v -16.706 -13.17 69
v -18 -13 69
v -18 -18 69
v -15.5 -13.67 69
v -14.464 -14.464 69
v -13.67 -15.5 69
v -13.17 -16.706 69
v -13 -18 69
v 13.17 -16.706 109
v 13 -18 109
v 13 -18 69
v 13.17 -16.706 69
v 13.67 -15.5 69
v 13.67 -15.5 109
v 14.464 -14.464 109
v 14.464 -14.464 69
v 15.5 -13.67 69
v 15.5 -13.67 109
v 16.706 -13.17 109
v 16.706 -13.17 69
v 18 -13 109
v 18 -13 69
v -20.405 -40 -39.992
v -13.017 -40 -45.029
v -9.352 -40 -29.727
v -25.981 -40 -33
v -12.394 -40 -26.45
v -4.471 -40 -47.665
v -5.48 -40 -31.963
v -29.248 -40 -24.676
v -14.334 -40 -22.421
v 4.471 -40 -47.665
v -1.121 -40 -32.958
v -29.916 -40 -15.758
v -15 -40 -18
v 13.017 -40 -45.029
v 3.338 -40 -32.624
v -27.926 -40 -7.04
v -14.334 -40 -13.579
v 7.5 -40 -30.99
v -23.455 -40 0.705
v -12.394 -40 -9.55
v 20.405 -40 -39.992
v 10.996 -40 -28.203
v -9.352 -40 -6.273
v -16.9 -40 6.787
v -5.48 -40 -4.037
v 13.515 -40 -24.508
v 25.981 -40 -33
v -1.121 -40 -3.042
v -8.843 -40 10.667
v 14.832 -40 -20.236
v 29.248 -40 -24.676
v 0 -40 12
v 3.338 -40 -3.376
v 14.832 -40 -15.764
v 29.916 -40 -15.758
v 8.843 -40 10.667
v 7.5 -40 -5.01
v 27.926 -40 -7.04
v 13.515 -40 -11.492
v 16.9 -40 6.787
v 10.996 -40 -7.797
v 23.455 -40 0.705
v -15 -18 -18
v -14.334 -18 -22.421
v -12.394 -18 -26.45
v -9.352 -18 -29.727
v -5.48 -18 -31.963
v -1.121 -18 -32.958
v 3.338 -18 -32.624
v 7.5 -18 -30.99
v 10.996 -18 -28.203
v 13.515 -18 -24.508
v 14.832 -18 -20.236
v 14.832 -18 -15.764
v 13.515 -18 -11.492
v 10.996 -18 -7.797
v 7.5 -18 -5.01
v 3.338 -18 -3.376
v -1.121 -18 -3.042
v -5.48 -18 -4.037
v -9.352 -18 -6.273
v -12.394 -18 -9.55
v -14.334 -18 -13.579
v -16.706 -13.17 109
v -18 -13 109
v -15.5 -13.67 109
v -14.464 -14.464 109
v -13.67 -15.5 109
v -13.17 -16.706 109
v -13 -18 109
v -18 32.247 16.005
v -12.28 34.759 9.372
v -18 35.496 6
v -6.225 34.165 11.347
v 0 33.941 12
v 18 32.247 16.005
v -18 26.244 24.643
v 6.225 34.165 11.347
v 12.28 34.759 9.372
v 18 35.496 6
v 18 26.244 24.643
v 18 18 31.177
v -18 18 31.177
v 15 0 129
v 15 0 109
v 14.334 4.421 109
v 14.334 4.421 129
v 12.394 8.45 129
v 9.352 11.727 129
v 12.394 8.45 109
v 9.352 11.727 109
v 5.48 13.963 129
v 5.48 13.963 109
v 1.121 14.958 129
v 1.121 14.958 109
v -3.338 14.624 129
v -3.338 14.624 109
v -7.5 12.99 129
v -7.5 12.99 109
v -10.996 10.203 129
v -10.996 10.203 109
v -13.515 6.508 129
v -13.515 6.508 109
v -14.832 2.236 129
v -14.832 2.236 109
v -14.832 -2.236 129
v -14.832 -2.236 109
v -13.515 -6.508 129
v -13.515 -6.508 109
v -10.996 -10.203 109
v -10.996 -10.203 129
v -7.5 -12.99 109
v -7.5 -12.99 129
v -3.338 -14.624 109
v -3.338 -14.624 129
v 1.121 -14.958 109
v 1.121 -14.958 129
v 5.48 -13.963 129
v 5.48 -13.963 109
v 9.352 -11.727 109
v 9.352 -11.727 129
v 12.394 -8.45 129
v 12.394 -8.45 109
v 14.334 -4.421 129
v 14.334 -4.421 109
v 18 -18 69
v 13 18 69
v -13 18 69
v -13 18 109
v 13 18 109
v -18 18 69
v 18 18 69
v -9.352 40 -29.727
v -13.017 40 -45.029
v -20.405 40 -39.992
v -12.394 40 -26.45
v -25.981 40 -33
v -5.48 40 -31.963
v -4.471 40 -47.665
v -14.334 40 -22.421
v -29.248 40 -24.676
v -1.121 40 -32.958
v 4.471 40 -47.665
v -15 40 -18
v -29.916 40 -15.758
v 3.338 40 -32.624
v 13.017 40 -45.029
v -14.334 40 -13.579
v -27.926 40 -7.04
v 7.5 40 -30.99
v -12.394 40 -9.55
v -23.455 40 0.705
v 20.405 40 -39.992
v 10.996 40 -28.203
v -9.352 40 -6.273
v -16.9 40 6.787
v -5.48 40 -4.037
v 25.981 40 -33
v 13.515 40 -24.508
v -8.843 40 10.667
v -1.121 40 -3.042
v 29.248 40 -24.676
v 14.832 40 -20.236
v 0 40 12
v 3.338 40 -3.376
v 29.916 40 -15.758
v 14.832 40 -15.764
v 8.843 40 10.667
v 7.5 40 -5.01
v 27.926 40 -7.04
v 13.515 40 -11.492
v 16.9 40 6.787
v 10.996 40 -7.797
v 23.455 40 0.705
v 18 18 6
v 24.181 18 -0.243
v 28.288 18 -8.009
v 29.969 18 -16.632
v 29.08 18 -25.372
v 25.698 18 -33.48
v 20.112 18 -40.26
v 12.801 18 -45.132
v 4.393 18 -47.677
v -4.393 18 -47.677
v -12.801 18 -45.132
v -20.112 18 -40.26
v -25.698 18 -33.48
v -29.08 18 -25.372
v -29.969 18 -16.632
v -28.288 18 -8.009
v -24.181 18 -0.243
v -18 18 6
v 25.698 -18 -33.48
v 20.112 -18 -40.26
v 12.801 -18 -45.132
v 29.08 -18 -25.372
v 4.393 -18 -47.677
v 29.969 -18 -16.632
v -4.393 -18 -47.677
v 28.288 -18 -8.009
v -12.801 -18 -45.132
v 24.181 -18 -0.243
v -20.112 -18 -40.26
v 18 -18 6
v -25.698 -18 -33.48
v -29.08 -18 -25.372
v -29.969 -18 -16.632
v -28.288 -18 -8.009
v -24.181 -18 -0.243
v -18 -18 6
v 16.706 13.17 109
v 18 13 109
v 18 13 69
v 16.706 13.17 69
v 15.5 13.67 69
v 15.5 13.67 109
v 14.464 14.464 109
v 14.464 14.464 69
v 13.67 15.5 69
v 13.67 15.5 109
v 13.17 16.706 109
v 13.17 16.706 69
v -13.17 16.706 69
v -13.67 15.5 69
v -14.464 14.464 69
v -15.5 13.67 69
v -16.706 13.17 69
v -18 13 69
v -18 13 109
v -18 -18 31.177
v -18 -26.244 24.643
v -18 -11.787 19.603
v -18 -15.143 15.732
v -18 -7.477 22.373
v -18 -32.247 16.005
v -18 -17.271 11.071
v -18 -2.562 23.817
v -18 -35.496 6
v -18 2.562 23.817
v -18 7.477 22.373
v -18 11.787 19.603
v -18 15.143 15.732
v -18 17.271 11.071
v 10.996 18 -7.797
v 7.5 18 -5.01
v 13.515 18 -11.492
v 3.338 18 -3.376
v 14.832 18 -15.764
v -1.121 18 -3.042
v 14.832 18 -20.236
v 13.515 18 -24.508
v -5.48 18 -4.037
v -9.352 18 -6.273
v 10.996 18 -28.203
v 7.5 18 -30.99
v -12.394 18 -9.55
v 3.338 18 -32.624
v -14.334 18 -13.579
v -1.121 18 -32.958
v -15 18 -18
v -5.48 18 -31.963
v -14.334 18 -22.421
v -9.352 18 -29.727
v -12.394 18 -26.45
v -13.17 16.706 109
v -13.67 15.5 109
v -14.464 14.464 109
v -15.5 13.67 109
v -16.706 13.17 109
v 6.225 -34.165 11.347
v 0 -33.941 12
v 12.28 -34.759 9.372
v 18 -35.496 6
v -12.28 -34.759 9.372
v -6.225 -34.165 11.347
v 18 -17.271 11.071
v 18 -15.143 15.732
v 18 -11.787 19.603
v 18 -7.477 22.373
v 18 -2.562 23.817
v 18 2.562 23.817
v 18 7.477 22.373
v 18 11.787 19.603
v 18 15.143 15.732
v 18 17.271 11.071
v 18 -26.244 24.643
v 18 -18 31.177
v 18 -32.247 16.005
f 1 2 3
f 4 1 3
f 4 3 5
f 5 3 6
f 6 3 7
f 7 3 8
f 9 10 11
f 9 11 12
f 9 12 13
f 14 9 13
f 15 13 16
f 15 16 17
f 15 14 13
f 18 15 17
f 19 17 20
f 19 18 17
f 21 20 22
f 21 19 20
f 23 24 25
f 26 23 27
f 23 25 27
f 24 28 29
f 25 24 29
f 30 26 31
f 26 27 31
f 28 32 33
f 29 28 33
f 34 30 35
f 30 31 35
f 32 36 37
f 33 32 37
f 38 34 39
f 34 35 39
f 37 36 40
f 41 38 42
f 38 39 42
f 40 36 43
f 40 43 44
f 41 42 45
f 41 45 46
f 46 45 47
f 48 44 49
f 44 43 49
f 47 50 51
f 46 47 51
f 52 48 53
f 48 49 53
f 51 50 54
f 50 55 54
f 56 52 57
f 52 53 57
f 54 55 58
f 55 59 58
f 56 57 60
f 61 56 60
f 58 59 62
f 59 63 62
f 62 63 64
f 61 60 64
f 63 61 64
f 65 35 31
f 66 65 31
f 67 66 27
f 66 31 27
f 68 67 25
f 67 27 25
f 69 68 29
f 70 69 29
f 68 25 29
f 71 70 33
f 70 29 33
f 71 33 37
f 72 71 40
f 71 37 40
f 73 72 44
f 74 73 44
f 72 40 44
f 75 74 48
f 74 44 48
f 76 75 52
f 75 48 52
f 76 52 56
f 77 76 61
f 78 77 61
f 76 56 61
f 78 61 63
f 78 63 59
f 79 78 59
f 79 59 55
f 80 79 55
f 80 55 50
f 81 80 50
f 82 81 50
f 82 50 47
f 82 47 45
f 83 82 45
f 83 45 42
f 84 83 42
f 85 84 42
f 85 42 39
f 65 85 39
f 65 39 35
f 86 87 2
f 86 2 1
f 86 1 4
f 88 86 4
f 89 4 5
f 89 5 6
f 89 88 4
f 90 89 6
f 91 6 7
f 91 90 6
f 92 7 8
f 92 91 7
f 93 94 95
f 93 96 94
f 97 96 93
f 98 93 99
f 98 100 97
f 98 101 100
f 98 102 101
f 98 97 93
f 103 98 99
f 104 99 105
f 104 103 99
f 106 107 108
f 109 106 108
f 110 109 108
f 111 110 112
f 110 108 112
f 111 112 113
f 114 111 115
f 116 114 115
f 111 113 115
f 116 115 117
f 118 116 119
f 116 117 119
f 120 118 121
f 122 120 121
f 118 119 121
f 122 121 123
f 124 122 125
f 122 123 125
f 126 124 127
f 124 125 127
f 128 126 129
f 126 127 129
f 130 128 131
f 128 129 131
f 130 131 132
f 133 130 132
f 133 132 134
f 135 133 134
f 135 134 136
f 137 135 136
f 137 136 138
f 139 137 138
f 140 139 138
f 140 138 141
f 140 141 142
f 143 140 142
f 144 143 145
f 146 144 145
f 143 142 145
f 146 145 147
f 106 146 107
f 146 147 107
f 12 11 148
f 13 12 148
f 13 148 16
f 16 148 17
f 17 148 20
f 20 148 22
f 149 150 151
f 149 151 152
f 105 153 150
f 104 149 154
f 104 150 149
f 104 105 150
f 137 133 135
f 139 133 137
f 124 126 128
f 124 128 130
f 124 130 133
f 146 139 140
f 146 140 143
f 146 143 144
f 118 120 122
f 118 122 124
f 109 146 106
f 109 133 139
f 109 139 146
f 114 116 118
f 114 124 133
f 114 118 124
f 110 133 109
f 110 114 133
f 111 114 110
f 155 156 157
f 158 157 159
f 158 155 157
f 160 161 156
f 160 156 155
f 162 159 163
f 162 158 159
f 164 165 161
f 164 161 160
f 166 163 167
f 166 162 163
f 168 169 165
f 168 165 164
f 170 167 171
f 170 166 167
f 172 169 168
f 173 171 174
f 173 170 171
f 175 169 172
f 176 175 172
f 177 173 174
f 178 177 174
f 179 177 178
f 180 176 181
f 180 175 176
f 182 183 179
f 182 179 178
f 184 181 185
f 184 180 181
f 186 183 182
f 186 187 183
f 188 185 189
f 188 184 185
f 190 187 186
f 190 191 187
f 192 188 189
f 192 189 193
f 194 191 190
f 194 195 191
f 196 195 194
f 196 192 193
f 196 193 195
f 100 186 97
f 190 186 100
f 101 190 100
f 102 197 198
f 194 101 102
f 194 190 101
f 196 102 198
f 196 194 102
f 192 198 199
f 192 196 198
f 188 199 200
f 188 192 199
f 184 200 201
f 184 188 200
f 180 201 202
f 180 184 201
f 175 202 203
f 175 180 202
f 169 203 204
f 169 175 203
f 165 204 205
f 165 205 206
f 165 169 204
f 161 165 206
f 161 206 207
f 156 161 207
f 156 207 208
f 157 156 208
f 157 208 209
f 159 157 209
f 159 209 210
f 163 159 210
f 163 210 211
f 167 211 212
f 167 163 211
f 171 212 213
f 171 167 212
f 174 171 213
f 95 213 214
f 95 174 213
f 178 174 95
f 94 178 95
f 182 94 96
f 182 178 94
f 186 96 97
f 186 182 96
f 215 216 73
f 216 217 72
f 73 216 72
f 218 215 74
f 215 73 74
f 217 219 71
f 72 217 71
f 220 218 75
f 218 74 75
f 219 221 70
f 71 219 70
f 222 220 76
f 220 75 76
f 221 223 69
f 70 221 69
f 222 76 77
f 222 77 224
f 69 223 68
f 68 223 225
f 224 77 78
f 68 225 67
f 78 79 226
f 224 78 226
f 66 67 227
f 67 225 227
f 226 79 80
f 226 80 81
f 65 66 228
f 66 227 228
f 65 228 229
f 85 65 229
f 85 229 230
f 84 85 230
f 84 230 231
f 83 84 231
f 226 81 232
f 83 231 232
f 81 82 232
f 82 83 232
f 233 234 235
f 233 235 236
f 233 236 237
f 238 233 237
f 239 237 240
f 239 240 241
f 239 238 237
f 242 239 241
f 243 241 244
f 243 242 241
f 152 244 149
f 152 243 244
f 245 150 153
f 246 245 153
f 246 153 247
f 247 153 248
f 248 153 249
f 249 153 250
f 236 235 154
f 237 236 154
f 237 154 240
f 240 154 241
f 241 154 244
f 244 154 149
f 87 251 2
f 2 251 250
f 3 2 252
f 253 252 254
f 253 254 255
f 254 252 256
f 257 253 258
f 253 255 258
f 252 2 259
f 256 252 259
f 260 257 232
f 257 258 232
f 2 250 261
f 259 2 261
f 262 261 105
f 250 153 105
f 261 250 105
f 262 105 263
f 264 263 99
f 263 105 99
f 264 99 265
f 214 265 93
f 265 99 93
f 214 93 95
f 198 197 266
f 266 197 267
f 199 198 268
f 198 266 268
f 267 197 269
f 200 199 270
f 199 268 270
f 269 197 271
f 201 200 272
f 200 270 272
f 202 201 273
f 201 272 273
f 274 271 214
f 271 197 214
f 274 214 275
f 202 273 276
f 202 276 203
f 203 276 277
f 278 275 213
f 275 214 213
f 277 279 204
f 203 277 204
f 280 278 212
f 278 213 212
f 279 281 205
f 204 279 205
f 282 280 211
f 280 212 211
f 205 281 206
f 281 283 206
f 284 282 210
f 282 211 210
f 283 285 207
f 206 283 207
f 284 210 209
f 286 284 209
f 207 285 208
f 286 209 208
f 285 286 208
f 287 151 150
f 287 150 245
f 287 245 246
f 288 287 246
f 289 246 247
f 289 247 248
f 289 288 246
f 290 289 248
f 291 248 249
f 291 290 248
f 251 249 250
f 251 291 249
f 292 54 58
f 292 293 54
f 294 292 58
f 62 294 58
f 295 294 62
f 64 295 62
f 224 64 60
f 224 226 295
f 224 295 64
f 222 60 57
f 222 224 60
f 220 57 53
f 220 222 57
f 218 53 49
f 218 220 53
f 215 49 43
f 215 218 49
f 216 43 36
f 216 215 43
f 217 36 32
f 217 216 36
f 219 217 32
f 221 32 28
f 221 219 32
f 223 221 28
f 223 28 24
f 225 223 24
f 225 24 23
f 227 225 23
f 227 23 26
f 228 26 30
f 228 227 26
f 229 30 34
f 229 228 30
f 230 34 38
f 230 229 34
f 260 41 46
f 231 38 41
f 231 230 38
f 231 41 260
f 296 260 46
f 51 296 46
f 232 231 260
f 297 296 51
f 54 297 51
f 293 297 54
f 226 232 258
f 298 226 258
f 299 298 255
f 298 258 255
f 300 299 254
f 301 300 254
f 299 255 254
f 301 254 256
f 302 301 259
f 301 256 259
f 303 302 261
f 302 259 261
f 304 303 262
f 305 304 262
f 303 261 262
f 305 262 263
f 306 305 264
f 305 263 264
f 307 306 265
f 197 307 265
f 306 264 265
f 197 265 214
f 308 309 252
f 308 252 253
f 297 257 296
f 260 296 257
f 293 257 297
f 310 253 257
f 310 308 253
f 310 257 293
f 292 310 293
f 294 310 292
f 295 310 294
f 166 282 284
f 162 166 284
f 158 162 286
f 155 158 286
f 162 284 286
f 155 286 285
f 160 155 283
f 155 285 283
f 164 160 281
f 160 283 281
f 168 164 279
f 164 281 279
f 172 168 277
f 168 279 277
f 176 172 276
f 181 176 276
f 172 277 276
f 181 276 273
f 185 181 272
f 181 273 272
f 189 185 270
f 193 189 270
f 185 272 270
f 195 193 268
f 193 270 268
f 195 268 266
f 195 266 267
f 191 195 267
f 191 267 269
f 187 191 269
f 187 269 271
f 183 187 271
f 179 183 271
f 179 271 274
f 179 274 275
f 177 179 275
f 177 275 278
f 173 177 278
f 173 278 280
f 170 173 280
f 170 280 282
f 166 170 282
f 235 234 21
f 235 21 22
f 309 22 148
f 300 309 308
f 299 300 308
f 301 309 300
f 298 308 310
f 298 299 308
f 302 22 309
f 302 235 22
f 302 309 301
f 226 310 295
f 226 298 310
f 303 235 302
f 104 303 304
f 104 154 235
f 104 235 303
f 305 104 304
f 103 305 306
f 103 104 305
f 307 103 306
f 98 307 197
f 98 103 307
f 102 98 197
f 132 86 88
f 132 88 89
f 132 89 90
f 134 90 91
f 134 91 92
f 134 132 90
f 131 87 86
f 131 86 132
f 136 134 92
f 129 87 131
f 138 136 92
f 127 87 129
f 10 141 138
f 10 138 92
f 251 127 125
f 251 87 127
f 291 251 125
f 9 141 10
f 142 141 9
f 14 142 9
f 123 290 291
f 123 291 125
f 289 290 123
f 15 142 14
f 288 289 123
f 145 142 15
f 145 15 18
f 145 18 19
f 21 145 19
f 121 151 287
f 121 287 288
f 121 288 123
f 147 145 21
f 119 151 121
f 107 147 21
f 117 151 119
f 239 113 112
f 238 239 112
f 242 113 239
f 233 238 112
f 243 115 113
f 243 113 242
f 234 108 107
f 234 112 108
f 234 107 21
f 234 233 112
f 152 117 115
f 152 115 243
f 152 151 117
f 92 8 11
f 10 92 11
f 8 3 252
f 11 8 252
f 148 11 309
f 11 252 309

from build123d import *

# Parameters (mm, degrees)
SKETCH1_R               = 36
BOSS_EXTRUDE1_DEPTH     = 18
SKETCH2_W               = 36
SKETCH2_H               = 36
BOSS_EXTRUDE2_DEPTH     = 109
SKETCH3_R               = 15
BOSS_EXTRUDE3_DEPTH     = 20
CUT_EXTRUDE1_DEPTH      = 40
CIRPATTERN1_COUNT       = 4
SKETCH5_R               = 30
BOSS_EXTRUDE4_DEPTH     = 40
CUT_EXTRUDE2_DEPTH      = 139.351002938
CUT_EXTRUDE2_DEPTH_BACK = 139.351002938
HOLE1_D                 = 30


with BuildPart() as part:
    # Sketch1 → Boss-Extrude1 (new, symmetric)
    with BuildSketch(Plane(origin=(0, 0, 0), x_dir=(0, 0, -1), z_dir=(1, 0, 0))):
        Circle(SKETCH1_R)
    extrude(amount=BOSS_EXTRUDE1_DEPTH, both=True)

    # Sketch2 → Boss-Extrude2 (add)
    with BuildSketch(Plane.XY):
        Rectangle(SKETCH2_W, SKETCH2_H)
    extrude(amount=BOSS_EXTRUDE2_DEPTH)

    # Sketch3 → Boss-Extrude3 (add)
    with BuildSketch(Plane.XY.offset(109)):
        Circle(SKETCH3_R)
    extrude(amount=BOSS_EXTRUDE3_DEPTH)

    # Sketch4 → Cut-Extrude1 (cut)
    with BuildSketch(Plane.XY.offset(109)):
        with BuildLine():
            Line((13, 18), (18, 18))
            Line((18, 18), (18, 13))
            ThreePointArc((18, 13), (14.464466094, 14.464466094), (13, 18))
        make_face()
    cut_extrude1 = extrude(amount=-CUT_EXTRUDE1_DEPTH, mode=Mode.SUBTRACT)

    # CirPattern1: Cut-Extrude1 ×4 about axis
    cirpattern1_axis = Axis((0, 0, 0), (0, 0, 1))
    for i in range(1, CIRPATTERN1_COUNT):
        add(cut_extrude1.rotate(cirpattern1_axis, i * 360 / CIRPATTERN1_COUNT), mode=Mode.SUBTRACT)

    # Sketch5 → Boss-Extrude4 (add, symmetric)
    with BuildSketch(Plane(origin=(0, 0, 0), x_dir=(1, 0, 0), z_dir=(0, 1, 0))):
        with Locations(Location((0, 18, 0), (0, 0, 270))):
            Circle(SKETCH5_R)
    extrude(amount=BOSS_EXTRUDE4_DEPTH, both=True)

    # Sketch6 → Cut-Extrude2 (cut, two sides: drawn at the far end of the back side and taken through both)
    with BuildSketch(Plane(origin=(0, 0, 0), x_dir=(0, 0, -1), z_dir=(1, 0, 0)).offset(-CUT_EXTRUDE2_DEPTH_BACK)):
        with BuildLine():
            Line((-6, 18), (48, 18))
            Line((48, 18), (48, -18))
            Line((48, -18), (-6, -18))
            ThreePointArc((-6, -18), (-24, 0), (-6, 18))
        make_face()
    extrude(amount=CUT_EXTRUDE2_DEPTH + CUT_EXTRUDE2_DEPTH_BACK, mode=Mode.SUBTRACT)

    # Hole1 (through all)
    with Locations(Plane(origin=(0, 40, 0), x_dir=(1, 0, 0), z_dir=(0, 1, 0))):
        with Locations((0, 18)):
            Hole(HOLE1_D / 2)


solid = part.part
